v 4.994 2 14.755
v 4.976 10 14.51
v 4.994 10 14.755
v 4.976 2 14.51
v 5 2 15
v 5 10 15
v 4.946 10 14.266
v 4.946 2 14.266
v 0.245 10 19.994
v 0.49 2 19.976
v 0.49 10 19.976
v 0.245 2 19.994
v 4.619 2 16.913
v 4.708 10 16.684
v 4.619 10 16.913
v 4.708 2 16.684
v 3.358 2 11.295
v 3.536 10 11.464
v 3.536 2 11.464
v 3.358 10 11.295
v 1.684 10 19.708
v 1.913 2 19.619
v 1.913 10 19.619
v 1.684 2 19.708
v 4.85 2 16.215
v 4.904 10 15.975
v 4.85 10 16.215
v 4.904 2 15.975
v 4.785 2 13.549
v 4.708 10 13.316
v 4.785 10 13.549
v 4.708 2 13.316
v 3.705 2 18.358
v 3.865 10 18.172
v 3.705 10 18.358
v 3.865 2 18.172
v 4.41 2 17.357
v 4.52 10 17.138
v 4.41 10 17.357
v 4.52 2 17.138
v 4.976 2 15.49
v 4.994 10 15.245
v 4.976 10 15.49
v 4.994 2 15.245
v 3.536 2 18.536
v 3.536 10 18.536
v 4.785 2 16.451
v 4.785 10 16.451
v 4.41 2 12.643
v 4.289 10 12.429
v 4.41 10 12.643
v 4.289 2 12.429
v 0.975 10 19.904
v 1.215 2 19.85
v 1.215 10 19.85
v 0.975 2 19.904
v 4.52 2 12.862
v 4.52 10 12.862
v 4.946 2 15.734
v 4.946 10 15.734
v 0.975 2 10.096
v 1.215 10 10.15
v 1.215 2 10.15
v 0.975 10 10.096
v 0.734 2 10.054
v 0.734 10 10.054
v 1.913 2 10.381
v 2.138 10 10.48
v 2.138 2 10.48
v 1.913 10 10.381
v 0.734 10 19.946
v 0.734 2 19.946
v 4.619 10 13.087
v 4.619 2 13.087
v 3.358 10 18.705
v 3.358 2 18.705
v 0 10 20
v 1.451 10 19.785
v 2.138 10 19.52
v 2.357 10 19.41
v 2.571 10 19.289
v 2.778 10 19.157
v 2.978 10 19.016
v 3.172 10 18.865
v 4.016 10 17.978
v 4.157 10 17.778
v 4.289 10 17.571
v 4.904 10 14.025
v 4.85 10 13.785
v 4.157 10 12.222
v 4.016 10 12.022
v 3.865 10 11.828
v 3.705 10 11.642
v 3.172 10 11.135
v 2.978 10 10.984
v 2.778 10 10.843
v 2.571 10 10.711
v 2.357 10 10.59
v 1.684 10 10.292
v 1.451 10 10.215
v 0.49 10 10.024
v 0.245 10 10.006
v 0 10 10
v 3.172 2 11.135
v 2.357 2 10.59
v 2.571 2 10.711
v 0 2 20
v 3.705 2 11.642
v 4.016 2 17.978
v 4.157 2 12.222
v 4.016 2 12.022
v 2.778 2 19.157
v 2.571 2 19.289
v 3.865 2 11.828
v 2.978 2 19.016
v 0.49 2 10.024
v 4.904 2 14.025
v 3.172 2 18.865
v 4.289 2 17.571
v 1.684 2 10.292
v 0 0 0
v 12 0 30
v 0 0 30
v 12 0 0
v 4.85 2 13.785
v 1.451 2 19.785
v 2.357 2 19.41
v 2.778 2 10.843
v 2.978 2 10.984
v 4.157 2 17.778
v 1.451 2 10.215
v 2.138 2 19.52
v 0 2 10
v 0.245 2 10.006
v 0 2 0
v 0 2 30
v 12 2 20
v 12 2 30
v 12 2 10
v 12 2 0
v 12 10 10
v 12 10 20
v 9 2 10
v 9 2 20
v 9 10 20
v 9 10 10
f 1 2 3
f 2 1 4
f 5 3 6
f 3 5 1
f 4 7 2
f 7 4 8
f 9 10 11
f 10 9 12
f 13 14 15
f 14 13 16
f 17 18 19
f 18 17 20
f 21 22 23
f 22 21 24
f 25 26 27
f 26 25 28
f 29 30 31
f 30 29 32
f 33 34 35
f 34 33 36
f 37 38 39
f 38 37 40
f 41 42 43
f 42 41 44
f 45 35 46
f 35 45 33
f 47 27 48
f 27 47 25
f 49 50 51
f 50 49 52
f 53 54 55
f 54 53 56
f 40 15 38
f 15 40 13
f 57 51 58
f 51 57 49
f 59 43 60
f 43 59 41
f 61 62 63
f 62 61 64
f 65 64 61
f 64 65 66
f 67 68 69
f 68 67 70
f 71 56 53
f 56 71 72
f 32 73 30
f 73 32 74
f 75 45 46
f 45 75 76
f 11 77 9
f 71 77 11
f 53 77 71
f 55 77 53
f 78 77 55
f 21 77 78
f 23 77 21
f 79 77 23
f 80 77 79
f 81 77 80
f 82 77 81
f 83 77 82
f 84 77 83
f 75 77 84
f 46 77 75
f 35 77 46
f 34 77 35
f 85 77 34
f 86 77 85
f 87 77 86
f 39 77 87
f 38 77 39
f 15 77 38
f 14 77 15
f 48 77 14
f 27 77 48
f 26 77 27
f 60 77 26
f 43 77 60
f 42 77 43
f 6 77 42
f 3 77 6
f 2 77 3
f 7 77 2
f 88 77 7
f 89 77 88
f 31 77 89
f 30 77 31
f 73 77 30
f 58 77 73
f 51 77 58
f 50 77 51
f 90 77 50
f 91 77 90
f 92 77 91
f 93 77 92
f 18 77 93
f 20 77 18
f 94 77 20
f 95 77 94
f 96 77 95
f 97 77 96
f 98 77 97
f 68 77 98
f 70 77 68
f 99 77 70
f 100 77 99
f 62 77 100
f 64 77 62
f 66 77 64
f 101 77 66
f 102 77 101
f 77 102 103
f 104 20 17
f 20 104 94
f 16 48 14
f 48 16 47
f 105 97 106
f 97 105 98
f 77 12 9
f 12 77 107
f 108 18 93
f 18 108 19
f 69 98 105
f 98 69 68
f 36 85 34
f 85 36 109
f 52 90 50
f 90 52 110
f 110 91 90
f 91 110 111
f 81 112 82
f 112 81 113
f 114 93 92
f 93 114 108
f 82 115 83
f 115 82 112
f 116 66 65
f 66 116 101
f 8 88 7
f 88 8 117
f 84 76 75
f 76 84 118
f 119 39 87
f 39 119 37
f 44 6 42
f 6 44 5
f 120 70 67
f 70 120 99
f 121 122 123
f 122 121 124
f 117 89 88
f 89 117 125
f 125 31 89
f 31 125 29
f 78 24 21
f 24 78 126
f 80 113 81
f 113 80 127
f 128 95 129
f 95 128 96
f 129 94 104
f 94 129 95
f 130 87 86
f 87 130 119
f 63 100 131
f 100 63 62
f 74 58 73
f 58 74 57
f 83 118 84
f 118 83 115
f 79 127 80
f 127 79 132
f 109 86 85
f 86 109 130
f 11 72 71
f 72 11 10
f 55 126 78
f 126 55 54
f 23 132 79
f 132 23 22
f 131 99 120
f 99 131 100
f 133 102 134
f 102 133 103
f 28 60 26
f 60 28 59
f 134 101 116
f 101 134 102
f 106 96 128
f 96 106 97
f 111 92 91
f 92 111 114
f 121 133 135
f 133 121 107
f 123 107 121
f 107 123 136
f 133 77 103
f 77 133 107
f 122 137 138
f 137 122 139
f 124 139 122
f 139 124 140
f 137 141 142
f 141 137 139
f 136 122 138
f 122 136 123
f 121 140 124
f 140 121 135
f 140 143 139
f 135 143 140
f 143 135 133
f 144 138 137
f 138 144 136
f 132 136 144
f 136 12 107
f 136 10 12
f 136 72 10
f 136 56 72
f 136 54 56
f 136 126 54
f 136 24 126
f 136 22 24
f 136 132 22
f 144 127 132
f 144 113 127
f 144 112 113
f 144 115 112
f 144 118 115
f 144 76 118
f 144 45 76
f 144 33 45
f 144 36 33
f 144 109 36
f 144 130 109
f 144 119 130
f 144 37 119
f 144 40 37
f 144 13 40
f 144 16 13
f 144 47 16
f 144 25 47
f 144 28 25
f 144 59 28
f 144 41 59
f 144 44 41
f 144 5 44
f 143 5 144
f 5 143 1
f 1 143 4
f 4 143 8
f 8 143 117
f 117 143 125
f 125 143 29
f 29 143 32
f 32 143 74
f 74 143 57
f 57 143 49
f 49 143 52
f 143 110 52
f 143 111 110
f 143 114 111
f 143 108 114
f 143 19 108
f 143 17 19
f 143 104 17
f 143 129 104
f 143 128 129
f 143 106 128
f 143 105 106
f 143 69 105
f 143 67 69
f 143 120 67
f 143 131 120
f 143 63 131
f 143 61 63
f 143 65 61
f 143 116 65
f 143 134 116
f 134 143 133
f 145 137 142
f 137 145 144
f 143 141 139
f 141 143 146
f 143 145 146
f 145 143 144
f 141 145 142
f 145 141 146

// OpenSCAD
$fn = 128;

width = 12;
height = 10;


cube([width, 2, 30]);

translate([0, 0, 5 + 10])
rotate([-90, 0, 0])
intersection() {
    cylinder(h=height, d=10);
    translate([0, -5, 0])
    cube([10, 10, 10]);
}

translate([9, 0, 10])
cube([3, height, 10]);
